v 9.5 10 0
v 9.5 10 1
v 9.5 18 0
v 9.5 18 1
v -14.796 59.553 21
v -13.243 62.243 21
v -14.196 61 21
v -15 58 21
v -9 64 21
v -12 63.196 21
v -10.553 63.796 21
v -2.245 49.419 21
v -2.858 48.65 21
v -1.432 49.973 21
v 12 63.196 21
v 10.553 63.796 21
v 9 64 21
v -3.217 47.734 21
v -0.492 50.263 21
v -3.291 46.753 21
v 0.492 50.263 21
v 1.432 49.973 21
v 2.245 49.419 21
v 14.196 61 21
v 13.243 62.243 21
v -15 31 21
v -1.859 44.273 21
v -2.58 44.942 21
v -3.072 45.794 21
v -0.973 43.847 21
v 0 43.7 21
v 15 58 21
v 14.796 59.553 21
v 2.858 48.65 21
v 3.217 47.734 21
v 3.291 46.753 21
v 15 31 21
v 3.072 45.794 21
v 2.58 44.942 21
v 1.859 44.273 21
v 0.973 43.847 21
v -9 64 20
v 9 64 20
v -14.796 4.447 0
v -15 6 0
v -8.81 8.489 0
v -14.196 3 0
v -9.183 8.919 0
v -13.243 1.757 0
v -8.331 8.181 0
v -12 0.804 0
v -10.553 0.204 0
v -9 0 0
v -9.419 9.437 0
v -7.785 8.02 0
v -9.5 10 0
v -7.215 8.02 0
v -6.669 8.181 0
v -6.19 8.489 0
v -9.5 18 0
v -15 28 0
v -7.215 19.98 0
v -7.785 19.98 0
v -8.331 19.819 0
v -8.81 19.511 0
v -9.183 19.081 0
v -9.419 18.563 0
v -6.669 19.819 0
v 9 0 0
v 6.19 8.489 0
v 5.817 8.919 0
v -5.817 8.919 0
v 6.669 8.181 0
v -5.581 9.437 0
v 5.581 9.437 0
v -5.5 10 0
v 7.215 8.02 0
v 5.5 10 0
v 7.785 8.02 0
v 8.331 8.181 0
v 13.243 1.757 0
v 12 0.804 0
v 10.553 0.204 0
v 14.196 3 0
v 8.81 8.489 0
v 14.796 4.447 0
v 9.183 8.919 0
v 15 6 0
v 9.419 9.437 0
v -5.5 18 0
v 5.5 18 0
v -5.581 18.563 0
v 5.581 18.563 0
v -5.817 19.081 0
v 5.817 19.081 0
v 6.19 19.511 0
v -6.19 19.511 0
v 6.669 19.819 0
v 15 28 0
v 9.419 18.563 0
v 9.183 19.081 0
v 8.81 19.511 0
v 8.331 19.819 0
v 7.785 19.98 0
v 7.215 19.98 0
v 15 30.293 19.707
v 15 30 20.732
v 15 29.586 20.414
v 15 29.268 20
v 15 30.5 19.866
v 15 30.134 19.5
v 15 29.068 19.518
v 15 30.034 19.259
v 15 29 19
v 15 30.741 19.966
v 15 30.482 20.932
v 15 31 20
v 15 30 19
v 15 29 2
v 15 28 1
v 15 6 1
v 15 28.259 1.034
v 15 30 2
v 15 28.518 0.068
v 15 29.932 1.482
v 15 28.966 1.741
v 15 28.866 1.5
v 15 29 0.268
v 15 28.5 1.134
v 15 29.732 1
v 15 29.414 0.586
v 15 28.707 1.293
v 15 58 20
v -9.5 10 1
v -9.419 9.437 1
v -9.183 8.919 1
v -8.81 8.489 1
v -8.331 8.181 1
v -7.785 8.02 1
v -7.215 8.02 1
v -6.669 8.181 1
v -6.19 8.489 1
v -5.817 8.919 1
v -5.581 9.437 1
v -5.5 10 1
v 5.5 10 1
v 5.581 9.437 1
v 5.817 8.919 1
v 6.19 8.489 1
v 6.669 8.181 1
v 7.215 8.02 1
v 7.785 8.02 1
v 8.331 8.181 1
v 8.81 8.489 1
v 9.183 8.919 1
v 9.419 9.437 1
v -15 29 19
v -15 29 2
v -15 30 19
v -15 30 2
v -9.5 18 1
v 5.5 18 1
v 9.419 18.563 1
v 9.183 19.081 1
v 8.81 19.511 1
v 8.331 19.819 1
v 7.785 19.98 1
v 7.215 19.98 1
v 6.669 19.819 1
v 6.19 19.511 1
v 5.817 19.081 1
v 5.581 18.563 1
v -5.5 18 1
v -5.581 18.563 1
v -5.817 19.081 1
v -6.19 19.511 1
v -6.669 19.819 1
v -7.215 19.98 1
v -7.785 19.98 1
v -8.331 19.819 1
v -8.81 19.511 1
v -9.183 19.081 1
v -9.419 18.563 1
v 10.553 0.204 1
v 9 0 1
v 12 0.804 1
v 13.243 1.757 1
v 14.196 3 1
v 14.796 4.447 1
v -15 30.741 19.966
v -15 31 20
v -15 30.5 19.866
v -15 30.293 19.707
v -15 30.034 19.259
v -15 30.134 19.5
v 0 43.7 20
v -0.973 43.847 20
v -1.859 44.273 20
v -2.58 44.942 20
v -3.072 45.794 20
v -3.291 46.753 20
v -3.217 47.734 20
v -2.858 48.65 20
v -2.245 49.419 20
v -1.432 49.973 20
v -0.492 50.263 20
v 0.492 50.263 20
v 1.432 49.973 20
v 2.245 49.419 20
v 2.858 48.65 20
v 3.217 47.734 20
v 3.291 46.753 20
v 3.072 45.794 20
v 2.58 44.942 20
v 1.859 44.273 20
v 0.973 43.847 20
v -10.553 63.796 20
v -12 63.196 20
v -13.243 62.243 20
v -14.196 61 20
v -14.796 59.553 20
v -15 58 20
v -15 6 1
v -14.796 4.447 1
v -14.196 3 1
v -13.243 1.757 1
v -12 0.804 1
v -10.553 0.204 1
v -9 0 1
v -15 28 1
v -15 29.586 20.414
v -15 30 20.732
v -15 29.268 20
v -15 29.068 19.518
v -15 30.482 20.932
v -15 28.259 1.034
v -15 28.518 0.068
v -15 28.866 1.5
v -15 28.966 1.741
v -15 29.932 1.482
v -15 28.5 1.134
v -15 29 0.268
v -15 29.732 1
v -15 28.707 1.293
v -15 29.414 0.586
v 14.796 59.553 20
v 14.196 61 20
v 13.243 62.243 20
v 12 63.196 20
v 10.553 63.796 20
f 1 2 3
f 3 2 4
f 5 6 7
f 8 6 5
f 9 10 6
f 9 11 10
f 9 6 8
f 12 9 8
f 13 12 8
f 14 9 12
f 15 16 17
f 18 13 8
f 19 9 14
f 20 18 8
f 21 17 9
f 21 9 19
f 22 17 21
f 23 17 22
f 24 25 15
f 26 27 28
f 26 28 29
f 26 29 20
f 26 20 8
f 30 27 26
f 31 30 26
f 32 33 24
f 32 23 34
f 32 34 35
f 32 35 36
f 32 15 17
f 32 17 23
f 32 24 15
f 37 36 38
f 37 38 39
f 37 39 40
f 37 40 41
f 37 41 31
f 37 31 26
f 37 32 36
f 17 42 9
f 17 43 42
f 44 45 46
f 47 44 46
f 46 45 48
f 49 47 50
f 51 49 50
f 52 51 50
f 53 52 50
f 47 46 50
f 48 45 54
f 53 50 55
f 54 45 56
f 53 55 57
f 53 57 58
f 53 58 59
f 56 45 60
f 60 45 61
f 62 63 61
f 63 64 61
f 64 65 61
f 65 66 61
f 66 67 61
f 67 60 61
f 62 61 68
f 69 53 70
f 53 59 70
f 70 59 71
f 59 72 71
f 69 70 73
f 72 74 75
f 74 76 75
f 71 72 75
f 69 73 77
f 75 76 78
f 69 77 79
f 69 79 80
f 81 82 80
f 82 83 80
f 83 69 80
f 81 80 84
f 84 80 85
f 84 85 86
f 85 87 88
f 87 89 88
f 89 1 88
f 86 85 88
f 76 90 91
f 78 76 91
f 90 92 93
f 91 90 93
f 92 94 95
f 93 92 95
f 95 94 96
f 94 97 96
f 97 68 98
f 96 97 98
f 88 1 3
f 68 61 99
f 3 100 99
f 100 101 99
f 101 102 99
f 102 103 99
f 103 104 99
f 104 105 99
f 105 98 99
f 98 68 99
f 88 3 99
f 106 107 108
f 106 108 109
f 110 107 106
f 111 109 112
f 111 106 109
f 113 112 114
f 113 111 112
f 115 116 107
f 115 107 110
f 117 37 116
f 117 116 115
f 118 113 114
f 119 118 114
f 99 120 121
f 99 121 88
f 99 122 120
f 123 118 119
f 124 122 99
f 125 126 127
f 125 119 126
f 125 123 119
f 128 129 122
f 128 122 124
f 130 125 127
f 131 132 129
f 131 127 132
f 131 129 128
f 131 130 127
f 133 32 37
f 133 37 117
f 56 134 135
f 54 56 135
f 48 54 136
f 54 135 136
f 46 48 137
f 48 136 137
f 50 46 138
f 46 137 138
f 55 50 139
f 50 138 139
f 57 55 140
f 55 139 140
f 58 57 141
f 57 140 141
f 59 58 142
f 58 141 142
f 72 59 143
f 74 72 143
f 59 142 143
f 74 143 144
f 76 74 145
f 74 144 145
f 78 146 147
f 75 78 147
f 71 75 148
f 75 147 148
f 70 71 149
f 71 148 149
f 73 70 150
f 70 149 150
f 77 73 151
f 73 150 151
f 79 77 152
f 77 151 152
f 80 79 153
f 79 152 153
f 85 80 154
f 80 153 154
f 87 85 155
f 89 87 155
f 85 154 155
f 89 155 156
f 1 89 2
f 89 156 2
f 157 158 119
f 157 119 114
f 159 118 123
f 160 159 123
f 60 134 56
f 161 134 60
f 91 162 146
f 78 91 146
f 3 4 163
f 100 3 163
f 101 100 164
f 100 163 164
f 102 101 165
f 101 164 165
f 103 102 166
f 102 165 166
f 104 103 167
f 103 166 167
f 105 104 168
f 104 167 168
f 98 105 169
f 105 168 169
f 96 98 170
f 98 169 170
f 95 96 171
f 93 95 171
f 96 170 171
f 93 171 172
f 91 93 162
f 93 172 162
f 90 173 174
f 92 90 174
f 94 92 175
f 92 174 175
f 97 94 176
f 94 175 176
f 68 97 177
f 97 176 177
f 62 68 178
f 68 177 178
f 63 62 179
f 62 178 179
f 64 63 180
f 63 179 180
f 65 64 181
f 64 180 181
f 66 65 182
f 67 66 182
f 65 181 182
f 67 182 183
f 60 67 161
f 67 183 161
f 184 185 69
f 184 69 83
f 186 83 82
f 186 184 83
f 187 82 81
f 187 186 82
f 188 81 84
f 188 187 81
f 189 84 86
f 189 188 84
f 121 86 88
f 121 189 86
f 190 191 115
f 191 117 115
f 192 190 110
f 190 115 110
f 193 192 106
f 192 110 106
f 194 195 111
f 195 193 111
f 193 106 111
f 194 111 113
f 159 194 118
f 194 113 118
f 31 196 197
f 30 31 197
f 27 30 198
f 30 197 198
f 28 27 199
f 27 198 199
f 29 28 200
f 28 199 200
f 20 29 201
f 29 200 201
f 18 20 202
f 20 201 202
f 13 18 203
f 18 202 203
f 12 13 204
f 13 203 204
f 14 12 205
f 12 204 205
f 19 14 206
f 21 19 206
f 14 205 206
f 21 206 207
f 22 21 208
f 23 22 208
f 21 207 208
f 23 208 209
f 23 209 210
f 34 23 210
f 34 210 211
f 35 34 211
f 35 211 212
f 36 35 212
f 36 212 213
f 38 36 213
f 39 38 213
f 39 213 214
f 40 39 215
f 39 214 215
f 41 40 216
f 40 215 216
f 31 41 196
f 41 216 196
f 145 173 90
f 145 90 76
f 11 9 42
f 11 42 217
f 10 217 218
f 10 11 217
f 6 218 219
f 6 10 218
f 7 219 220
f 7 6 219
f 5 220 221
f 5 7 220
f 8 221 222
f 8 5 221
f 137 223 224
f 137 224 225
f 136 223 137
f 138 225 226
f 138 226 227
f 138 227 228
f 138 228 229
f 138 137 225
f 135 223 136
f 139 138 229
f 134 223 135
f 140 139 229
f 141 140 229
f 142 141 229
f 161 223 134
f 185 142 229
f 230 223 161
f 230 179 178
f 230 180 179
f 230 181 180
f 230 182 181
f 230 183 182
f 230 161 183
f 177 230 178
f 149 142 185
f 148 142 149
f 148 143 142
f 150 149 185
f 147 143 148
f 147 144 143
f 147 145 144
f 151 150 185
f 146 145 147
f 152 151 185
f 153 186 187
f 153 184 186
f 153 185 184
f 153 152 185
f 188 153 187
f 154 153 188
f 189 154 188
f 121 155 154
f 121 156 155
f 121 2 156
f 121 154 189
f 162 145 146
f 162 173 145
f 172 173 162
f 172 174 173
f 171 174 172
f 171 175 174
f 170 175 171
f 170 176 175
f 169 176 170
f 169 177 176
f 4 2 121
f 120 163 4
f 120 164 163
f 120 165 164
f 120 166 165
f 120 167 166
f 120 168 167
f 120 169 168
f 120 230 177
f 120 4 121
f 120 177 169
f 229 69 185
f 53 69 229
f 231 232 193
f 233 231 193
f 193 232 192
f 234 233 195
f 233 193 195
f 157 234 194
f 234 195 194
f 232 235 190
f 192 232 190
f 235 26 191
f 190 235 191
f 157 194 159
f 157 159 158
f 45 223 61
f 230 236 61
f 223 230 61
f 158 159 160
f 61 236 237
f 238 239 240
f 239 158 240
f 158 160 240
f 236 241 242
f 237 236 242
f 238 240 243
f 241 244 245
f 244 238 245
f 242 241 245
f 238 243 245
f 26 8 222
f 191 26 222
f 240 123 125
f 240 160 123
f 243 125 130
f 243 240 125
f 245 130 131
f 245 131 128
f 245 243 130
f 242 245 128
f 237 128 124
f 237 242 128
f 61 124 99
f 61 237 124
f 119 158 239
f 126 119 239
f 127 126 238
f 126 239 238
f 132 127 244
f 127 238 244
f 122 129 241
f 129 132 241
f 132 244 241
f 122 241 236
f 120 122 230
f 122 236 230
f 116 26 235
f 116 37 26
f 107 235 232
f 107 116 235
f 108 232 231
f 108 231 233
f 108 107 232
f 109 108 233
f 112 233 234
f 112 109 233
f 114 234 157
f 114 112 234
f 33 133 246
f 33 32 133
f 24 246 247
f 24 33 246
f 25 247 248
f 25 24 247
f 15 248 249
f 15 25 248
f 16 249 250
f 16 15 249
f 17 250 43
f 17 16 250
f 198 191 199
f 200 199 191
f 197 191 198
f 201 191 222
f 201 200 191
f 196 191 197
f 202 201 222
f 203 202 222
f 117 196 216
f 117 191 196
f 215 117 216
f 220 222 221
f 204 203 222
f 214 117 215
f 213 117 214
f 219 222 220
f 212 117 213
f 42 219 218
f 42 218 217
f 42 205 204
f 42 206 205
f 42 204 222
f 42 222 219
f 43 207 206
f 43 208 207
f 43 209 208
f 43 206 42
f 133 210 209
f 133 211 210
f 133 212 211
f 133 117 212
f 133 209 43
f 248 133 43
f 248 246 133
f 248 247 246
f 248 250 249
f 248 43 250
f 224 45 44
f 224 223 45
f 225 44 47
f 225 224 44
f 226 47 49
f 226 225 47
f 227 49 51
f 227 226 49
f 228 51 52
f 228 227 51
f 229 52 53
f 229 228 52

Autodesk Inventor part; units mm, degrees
ref_plane "YZ Plane" through (0, 0, 0) normal (1, 0, 0) x (0, 1, 0)
ref_plane "XZ Plane" through (0, 0, 0) normal (0, 1, 0) x (-1, 0, 0)
ref_plane "XY Plane" through (0, 0, 0) normal (0, 0, 1) x (1, 0, 0)
sketch "Skizze1" plane through (0, 0, 0) normal (0, 0, 1) x (1, 0, 0)
  line L0 (-15, 30) -> (15, 30)
  line L1 (15, 30) -> (15, 0)
  line L2 (15, 0) -> (-15, 0)
  line L3 (-15, 0) -> (-15, 30)
  line L4 (-15, 30) -> (15, 0) construction
  line L5 (15, 30) -> (-15, 0) construction
  point P0 (0, 0)
  point P1 (0, 15)
  dimension "d0" = 30
  dimension "d1" = 30
extrude "Grobblech1" add sketch "Skizze1" along normal blind 1
sketch "Skizze2" plane through (-15, 29, 0) normal (0, 1, 0) x (-1, 0, 0)
  line L0 (-30, 0) -> (0, 0)
  line L1 (0, 0) -> (0, 21)
  line L2 (0, 21) -> (-30, 21)
  line L3 (-30, 21) -> (-30, 0)
edge flange "Lasche1" height 20 angle 90 thickness 1 bend radius 1 thickness toward (0, 1, 0) relief tear relief width 1 relief depth 0.5 edges at (0, 30, 1) wall of the first edge with corners at (15, 29, 0) (-15, 29, 0) (-15, 29, 21) (15, 29, 21)
bend "Biegung1"
corner "Ecke1"
sketch "Skizze3" plane through (15, 29, 20) normal (0, 0, 1) x (1, 0, 0)
  line L0 (-30, 0) -> (0, 0)
  line L1 (0, 0) -> (0, 35)
  line L2 (0, 35) -> (-30, 35)
  line L3 (-30, 35) -> (-30, 0)
edge flange "Lasche2" height 34 angle 90 thickness 1 bend radius 1 thickness toward (0, 0, 1) relief tear relief width 1 relief depth 0.5 edges at (0, 30, 21) wall of the first edge with corners at (-15, 29, 20) (15, 29, 20) (15, 64, 20) (-15, 64, 20)
bend "Biegung2"
corner "Ecke2"
hole "Bohrung2" at (0, 47, 21) direction (0, 0, -1) diameter 6.6 end through all clearance for "Sechskantkopfschraube DIN EN 24017" size "M6" standard "DIN"
sketch "Skizze6" plane through (0, 0, 1) normal (0, 0, 1) x (1, 0, 0)
  line L0 (15, 28) -> (-15, 28) projected
  line L1 (-15, 0) -> (-15, 28) projected
  line L2 (7.5, 10) -> (7.5, 18) construction
  line L3 (9.5, 10) -> (9.5, 18)
  line L4 (5.5, 18) -> (5.5, 10)
  arc A0 (5.5, 10) -> (9.5, 10) centre (7.5, 10) ccw
  arc A1 (9.5, 18) -> (5.5, 18) centre (7.5, 18) ccw
  line L5 (0, 28) -> (0, 0) construction
  line L6 (-7.5, 10) -> (-7.5, 18) construction
  line L7 (-9.5, 10) -> (-9.5, 18)
  line L8 (-5.5, 18) -> (-5.5, 10)
  arc A2 (-9.5, 10) -> (-5.5, 10) centre (-7.5, 10) ccw
  arc A3 (-5.5, 18) -> (-9.5, 18) centre (-7.5, 18) ccw
  point P0 (7.5, 14)
  point P1 (-7.5, 14)
  point P2 (0, 14)
  dimension "d47" = 15
  dimension "d48" = 12
  dimension "d50" = 4
extrude "Extrusion2" cut sketch "Skizze6" against normal through all
fillet "Eckenrundung1" radius 6 4 edges at (15, 0, 0.5) (-15, 0, 0.5) (-15, 64, 20.5) (15, 64, 20.5)
equation "\"d45\" = Stärke"
equation "\"d3\" = BreiteBiegungsfreistellung"
equation "\"d4\" = TiefeBiegungsfreistellung"
equation "\"d5\" = MinimalRest"
equation "\"d6\" = Biegeradius"
equation "\"d9\" = Biegeradius"
equation "\"d10\" = GrößeEckenfreistellung"
equation "\"d11\" = Abstandsgröße"
equation "\"d12\" = JacobiRadiusGröße"
equation "\"d13\" = BreiteBiegungsfreistellung"
equation "\"d14\" = TiefeBiegungsfreistellung"
equation "\"d15\" = MinimalRest"
equation "\"d16\" = Biegeradius"
equation "\"d19\" = Biegeradius"
equation "\"d20\" = GrößeEckenfreistellung"
equation "\"d21\" = Abstandsgröße"
equation "\"d22\" = JacobiRadiusGröße"
equation "\"Biegeradius\" = Stärke"
equation "\"BreiteBiegungsfreistellung\" = Stärke"
equation "\"TiefeBiegungsfreistellung\" = 0.5 * Stärke"
equation "\"GrößeEckenfreistellung\" = 4 * Stärke"
equation "\"MinimalRest\" = 2 * Stärke"
equation "\"Übergangsradius\" = Biegeradius"
equation "\"JacobiRadiusGröße\" = Biegeradius"
equation "\"Abstandsgröße\" = Stärke"
equation "\"d2\" = Biegeradius"
equation "\"Stärke\" = 1"
properties part number "Tunel_IRBeamHolder"
